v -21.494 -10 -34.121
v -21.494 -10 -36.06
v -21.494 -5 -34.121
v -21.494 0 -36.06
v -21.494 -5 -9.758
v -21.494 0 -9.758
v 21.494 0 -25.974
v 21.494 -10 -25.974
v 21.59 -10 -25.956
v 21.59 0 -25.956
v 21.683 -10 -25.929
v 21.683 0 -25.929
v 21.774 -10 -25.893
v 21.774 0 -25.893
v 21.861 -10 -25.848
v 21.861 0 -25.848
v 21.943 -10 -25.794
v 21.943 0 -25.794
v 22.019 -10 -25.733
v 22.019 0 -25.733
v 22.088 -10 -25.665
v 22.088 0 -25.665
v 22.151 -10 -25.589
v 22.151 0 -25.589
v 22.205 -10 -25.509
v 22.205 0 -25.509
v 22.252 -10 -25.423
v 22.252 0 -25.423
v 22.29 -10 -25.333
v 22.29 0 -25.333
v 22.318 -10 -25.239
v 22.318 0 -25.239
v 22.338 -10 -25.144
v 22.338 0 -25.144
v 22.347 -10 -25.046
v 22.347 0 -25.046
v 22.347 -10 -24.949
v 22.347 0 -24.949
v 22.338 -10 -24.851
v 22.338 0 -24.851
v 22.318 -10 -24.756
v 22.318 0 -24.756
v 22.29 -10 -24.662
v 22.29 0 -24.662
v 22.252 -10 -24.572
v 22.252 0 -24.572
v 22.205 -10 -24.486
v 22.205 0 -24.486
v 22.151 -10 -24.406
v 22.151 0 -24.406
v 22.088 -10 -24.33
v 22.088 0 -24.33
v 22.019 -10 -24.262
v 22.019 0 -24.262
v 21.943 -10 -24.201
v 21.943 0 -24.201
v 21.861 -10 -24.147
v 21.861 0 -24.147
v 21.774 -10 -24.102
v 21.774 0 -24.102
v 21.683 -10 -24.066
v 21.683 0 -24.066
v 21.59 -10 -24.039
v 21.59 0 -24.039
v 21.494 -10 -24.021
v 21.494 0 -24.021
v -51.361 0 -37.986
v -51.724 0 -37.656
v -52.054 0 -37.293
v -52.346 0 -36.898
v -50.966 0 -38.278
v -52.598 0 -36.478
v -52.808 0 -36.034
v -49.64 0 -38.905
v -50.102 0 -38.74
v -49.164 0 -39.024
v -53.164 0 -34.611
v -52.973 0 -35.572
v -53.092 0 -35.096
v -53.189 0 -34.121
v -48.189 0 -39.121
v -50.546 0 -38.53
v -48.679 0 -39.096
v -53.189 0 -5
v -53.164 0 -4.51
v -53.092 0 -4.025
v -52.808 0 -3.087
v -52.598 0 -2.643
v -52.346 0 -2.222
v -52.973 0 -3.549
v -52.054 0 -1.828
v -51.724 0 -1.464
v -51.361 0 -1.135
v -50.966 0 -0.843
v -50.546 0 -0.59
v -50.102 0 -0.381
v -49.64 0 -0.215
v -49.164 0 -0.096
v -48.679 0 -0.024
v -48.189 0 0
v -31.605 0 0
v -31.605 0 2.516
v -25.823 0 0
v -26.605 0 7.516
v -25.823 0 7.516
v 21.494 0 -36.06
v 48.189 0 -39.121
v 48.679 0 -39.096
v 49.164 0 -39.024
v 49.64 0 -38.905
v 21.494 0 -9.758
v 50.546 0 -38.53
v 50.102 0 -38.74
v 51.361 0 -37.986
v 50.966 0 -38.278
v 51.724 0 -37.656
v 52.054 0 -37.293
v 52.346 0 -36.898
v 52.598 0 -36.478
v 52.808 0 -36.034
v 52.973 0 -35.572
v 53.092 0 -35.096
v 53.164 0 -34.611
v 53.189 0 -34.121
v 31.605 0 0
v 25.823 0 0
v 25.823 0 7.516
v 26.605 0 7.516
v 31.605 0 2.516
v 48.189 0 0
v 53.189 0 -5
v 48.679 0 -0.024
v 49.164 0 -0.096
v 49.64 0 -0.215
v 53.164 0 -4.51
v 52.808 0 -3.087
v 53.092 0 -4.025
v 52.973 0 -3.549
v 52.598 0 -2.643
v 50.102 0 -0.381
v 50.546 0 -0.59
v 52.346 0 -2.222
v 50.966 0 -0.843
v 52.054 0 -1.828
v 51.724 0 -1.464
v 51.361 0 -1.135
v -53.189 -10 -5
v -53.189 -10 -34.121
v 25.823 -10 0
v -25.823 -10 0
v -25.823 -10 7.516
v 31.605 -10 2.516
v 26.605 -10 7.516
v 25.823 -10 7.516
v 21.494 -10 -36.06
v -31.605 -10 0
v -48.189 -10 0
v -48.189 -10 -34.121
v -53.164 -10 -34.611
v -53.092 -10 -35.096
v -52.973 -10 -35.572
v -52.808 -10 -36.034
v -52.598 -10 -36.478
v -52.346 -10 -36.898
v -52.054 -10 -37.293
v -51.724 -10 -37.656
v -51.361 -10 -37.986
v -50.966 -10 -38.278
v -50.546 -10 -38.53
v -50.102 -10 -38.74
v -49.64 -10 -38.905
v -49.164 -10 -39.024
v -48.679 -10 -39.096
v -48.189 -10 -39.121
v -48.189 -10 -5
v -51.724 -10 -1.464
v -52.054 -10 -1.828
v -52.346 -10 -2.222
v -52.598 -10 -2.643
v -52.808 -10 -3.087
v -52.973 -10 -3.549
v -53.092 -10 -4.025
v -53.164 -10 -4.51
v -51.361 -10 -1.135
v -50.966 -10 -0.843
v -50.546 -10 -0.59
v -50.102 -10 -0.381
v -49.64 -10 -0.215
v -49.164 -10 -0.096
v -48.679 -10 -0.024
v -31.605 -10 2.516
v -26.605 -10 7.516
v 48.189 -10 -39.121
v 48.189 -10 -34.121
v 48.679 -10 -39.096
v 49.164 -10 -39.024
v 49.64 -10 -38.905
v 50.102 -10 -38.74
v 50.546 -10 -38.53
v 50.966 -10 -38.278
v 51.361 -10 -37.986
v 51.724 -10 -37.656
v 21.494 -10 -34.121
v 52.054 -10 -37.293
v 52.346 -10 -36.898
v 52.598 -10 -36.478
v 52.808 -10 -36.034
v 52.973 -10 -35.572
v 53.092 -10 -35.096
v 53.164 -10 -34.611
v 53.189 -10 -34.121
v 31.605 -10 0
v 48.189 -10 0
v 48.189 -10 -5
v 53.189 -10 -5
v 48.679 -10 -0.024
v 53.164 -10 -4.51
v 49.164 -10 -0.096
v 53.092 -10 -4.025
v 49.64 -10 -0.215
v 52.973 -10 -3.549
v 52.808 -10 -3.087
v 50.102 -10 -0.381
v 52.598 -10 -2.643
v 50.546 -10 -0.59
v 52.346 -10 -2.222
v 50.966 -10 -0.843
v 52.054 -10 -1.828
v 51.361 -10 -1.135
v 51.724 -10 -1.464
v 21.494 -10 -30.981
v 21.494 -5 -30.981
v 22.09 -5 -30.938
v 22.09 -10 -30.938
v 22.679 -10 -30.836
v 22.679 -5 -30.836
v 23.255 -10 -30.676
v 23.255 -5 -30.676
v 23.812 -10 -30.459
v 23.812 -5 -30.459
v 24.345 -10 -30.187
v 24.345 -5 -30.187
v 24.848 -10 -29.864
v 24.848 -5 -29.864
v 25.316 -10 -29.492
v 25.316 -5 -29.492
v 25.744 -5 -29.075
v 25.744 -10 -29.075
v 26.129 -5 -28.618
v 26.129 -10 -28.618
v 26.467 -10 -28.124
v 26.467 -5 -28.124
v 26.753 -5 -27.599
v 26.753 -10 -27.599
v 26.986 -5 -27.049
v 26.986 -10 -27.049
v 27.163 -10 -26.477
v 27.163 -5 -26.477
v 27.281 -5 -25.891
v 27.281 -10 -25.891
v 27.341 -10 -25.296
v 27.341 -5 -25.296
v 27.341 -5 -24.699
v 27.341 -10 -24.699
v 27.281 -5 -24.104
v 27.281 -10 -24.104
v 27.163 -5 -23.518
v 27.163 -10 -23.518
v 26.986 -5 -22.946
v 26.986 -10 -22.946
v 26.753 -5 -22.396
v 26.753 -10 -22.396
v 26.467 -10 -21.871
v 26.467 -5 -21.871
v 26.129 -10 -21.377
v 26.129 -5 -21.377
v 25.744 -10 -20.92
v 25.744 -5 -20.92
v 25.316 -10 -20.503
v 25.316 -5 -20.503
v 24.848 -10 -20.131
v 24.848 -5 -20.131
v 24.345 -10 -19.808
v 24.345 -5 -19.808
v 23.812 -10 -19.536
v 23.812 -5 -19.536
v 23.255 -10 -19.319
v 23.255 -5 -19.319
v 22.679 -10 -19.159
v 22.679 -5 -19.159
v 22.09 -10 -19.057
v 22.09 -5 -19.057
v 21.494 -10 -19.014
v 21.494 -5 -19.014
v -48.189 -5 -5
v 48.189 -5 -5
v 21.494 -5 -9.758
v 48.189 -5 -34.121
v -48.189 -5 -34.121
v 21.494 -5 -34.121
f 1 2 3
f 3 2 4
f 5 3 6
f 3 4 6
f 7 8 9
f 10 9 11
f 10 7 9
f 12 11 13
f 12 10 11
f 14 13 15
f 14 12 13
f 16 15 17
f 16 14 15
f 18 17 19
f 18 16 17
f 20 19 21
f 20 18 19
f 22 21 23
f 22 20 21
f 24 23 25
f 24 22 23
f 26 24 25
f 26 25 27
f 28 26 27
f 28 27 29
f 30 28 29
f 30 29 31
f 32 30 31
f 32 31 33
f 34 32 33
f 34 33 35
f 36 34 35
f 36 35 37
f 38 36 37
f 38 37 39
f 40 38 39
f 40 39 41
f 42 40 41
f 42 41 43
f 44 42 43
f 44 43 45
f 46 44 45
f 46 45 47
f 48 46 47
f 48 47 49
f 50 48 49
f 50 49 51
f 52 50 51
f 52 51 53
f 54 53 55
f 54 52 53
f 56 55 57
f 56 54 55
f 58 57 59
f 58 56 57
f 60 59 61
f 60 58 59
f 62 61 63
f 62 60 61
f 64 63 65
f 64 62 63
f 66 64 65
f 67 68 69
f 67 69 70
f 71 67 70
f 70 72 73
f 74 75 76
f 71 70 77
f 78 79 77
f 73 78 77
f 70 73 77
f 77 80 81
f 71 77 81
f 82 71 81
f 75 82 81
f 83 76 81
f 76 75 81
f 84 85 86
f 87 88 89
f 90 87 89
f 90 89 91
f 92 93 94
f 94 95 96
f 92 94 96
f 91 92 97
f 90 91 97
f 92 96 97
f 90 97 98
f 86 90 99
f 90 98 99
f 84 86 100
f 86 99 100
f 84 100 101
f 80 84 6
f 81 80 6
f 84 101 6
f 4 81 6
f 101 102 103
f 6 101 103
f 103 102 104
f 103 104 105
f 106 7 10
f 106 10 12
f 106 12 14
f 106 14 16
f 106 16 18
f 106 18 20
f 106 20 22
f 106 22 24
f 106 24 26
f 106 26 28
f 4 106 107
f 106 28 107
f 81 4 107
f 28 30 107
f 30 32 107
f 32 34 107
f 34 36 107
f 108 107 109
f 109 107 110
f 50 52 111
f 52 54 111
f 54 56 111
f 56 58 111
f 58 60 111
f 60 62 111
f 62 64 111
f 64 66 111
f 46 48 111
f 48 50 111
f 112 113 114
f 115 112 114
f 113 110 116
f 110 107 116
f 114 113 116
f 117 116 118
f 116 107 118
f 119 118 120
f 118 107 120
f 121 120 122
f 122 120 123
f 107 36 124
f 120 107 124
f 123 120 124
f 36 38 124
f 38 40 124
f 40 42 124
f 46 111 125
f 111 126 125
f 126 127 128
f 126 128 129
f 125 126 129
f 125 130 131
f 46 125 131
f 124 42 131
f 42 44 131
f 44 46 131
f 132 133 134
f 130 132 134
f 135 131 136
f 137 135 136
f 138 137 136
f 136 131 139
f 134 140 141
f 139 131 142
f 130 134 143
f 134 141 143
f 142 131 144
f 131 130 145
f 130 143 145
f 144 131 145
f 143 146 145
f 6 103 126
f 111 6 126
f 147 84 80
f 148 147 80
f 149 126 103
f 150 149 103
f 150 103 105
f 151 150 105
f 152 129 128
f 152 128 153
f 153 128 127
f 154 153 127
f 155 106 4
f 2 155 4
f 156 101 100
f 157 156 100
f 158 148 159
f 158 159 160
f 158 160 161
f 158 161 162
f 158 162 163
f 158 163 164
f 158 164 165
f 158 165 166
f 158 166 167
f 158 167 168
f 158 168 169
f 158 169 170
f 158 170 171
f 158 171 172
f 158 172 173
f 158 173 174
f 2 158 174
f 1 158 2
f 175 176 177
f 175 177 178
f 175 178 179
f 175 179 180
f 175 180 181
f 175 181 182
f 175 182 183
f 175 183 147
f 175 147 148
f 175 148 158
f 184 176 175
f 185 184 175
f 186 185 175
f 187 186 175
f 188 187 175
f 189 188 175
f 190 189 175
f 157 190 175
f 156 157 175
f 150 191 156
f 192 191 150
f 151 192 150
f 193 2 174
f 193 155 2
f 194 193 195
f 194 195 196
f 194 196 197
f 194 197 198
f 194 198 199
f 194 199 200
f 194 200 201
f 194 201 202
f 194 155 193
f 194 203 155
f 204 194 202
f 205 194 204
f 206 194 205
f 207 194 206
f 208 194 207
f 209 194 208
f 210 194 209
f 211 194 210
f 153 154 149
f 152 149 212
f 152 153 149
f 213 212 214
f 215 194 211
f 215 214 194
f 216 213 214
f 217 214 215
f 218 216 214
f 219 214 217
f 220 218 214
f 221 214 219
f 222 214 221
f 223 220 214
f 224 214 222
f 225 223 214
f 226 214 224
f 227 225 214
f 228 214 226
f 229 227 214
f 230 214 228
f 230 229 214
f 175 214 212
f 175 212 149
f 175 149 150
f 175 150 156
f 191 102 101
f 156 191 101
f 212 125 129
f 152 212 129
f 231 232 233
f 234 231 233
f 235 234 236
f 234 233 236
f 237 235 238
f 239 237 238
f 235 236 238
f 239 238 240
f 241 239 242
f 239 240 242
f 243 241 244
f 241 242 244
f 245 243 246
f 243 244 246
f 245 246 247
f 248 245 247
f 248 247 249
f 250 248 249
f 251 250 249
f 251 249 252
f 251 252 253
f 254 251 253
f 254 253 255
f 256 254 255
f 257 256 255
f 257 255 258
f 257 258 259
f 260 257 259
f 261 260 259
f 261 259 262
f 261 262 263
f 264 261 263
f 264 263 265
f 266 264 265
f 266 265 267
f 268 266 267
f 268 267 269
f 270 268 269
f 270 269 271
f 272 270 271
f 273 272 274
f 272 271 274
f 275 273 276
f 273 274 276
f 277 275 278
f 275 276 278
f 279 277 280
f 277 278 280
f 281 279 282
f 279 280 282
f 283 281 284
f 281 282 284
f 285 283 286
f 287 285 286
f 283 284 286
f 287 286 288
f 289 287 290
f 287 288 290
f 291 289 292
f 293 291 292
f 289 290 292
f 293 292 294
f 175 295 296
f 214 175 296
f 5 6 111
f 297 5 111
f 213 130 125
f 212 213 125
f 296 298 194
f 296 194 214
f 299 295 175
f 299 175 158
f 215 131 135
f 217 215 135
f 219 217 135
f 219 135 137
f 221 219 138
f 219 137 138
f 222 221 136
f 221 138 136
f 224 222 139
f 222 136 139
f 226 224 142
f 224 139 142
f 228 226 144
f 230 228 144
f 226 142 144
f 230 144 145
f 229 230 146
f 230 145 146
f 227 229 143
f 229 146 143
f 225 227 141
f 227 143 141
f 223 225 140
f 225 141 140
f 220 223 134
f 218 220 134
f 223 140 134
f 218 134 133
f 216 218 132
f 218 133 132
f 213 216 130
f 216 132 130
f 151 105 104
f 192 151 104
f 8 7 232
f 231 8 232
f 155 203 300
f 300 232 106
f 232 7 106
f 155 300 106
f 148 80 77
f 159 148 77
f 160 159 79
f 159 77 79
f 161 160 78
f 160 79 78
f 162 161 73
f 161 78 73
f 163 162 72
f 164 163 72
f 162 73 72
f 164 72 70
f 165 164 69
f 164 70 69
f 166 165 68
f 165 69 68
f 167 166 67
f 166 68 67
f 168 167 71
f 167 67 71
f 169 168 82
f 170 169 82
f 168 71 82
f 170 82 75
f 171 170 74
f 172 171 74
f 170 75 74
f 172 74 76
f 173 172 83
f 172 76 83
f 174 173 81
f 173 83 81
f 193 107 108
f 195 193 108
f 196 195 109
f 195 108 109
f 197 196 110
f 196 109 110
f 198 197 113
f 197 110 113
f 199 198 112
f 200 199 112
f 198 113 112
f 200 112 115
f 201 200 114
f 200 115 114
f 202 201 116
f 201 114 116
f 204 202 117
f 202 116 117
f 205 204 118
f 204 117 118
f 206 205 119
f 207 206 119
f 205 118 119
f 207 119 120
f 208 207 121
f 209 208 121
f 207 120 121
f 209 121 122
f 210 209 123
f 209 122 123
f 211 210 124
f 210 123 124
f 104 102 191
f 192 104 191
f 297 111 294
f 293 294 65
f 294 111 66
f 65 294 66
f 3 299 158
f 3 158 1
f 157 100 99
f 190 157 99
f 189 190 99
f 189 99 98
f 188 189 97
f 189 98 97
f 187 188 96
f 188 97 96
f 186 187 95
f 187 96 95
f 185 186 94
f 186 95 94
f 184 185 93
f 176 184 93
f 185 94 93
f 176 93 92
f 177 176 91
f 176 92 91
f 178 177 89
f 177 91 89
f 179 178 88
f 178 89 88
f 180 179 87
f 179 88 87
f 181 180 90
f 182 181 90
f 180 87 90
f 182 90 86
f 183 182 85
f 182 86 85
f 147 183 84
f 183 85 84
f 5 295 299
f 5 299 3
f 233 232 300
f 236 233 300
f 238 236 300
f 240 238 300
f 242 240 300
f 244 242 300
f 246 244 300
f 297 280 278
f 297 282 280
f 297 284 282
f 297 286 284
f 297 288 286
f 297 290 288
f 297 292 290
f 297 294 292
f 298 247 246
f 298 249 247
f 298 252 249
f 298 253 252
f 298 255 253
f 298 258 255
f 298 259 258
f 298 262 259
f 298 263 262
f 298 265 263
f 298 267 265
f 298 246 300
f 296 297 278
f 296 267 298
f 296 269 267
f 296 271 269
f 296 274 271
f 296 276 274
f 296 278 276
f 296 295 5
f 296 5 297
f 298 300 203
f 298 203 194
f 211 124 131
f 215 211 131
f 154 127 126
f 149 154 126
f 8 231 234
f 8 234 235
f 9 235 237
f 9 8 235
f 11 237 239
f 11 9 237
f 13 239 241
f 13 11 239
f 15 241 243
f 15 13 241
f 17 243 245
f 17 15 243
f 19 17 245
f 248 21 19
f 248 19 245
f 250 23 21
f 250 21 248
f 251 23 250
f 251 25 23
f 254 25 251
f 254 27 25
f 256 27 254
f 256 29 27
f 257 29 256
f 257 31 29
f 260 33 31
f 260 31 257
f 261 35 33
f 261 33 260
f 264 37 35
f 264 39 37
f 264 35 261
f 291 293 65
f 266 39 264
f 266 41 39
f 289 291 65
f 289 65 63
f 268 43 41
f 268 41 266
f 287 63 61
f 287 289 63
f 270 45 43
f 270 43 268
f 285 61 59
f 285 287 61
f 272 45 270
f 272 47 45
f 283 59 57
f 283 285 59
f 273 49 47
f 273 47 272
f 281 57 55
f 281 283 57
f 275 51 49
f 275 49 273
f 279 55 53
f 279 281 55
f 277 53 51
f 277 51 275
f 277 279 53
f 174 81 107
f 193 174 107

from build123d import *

# Parameters (mm, degrees)
F0_R        = 0.9849519721
F1_DEPTH    = 10
F2_T        = 5
F2_T3_DEPTH = 20
F3_SIZE     = 5
F5_DEPTH    = 25


# Not quite as in the source:
# - a shell that OpenCascade refuses in one call is made with other operations: the cavity is built on its own and cut out


with BuildPart() as f1:
    # F0 (on Front) → F1 (new body)
    with BuildSketch(Plane.XZ):
        with BuildLine():
            Line((25.823418051, 0), (0, 0))
            Line((0, 0), (-25.823418051, 0))
            Line((-25.823418051, 0), (-25.823418051, 7.5157736428))
            Line((-25.823418051, 7.5157736428), (-31.6047780216, 7.5157736428))
            Line((-31.6047780216, 7.5157736428), (-31.6047780216, 0))
            Line((-31.6047780216, 0), (-48.1885363162, 0))
            ThreePointArc((-48.1885363162, 0), (-51.7240702221, -1.4644660941), (-53.1885363162, -5))
            Line((-53.1885363162, -5), (-53.1885363162, -34.1205511987))
            ThreePointArc((-53.1885363162, -34.1205511987), (-51.7240702221, -37.6560851047), (-48.1885363162, -39.1205511987))
            Line((-48.1885363162, -39.1205511987), (0, -39.1205511987))
            Line((0, -39.1205511987), (48.1885363162, -39.1205511987))
            ThreePointArc((48.1885363162, -39.1205511987), (51.7240702221, -37.6560851047), (53.1885363162, -34.1205511987))
            Line((53.1885363162, -34.1205511987), (53.1885363162, -5))
            ThreePointArc((53.1885363162, -5), (51.7240702221, -1.4644660941), (48.1885363162, 0))
            Line((48.1885363162, 0), (31.6047780216, 0))
            Line((31.6047780216, 0), (31.6047780216, 7.5157736428))
            Line((31.6047780216, 7.5157736428), (25.823418051, 7.5157736428))
            Line((25.823418051, 7.5157736428), (25.823418051, 0))
        make_face()
        with Locations((21.3635135442, -24.997510016)):
            Circle(F0_R, mode=Mode.SUBTRACT)
    extrude(amount=F1_DEPTH)

    # F2: shell of thickness 5, made by hand


with BuildPart() as f2_core1:
    # F2_t2: copy of F1
    add(f1.part)

    # the walls: a layer under each face that stays
    f2_faces = [f2_core1.faces().sort_by_distance(p)[0] for p in [
        (39.8966571689, -5, 0),
        (20.3785615721, -5, -24.997510016),
        (53.1885363162, -5, -19.5602755994),
        (0, -5, -39.1205511987),
        (-53.1885363162, -5, -19.5602755994),
        (-39.8966571689, -5, 0),
        (-31.6047780216, -5, 3.7578868214),
        (-28.7140980363, -5, 7.5157736428),
        (-25.823418051, -5, 3.7578868214),
        (0, -5, 0),
        (25.823418051, -5, 3.7578868214),
        (28.7140980363, -5, 7.5157736428),
        (0, 0, -15.802388778),
        (31.6047780216, -5, 3.7578868214),
    ]]
    thicken(f2_faces, amount=-F2_T, mode=Mode.SUBTRACT)

    # F2_s4 → F2_t3 (cut)
    with BuildSketch(Plane.XZ.offset(-5)):
        Polygon((31.6547780216, 0.05), (31.6047780216, -5), (26.6047780216, -5), (26.6047780216, 0), align=None)
        Polygon((-31.6547780216, 0.05), (-31.6047780216, -5), (-26.6047780216, -5), (-26.6047780216, 0), align=None)
        Polygon((-25.773418051, 0.05), (-30.823418051, 0), (-30.823418051, -5), (-25.823418051, -5), align=None)
        Polygon((25.773418051, 0.05), (25.823418051, -5), (30.823418051, -5), (30.823418051, 0), align=None)
    extrude(amount=F2_T3_DEPTH, mode=Mode.SUBTRACT)


with BuildPart() as f1_1:
    add(f1.part)

    # what is left inside the walls is the cavity
    f2_cavity = [f2_core1.part.solids().sort_by_distance(p)[0] for p in [
        (0, -9.95, -24.413701),
    ]]
    add(f2_cavity, mode=Mode.SUBTRACT)

    # F3
    f3_edges = [f1_1.edges().sort_by_distance(p)[0] for p in [
        (-31.604778, -5, 7.515774),
        (31.604778, -5, 7.515774),
    ]]
    chamfer(f3_edges, length=F3_SIZE)

    # F4 (on face) → F5 (cut)
    with BuildSketch(Plane(origin=(0, 0, 0), x_dir=(-1, 0, 0), z_dir=(0, 1, 0))):
        with BuildLine():
            Line((21.4935876429, -36.0602382571), (21.4935876429, -9.7583141178))
            Line((21.4935876429, -9.7583141178), (-21.4935876429, -9.7583141178))
            Line((-21.4935876429, -9.7583141178), (-21.4935876429, -24.0211847033))
            ThreePointArc((-21.4935876429, -24.0211847033), (-20.714663158, -24.2564812961), (-20.3785615721, -24.997510016))
            ThreePointArc((-20.3785615721, -24.997510016), (-20.714663158, -25.7385387358), (-21.4935876429, -25.9738353286))
            Line((-21.4935876429, -25.9738353286), (-21.4935876429, -36.0602382571))
            Line((-21.4935876429, -36.0602382571), (21.4935876429, -36.0602382571))
        make_face()
    extrude(amount=-F5_DEPTH, mode=Mode.SUBTRACT)


solid = f1_1.part
